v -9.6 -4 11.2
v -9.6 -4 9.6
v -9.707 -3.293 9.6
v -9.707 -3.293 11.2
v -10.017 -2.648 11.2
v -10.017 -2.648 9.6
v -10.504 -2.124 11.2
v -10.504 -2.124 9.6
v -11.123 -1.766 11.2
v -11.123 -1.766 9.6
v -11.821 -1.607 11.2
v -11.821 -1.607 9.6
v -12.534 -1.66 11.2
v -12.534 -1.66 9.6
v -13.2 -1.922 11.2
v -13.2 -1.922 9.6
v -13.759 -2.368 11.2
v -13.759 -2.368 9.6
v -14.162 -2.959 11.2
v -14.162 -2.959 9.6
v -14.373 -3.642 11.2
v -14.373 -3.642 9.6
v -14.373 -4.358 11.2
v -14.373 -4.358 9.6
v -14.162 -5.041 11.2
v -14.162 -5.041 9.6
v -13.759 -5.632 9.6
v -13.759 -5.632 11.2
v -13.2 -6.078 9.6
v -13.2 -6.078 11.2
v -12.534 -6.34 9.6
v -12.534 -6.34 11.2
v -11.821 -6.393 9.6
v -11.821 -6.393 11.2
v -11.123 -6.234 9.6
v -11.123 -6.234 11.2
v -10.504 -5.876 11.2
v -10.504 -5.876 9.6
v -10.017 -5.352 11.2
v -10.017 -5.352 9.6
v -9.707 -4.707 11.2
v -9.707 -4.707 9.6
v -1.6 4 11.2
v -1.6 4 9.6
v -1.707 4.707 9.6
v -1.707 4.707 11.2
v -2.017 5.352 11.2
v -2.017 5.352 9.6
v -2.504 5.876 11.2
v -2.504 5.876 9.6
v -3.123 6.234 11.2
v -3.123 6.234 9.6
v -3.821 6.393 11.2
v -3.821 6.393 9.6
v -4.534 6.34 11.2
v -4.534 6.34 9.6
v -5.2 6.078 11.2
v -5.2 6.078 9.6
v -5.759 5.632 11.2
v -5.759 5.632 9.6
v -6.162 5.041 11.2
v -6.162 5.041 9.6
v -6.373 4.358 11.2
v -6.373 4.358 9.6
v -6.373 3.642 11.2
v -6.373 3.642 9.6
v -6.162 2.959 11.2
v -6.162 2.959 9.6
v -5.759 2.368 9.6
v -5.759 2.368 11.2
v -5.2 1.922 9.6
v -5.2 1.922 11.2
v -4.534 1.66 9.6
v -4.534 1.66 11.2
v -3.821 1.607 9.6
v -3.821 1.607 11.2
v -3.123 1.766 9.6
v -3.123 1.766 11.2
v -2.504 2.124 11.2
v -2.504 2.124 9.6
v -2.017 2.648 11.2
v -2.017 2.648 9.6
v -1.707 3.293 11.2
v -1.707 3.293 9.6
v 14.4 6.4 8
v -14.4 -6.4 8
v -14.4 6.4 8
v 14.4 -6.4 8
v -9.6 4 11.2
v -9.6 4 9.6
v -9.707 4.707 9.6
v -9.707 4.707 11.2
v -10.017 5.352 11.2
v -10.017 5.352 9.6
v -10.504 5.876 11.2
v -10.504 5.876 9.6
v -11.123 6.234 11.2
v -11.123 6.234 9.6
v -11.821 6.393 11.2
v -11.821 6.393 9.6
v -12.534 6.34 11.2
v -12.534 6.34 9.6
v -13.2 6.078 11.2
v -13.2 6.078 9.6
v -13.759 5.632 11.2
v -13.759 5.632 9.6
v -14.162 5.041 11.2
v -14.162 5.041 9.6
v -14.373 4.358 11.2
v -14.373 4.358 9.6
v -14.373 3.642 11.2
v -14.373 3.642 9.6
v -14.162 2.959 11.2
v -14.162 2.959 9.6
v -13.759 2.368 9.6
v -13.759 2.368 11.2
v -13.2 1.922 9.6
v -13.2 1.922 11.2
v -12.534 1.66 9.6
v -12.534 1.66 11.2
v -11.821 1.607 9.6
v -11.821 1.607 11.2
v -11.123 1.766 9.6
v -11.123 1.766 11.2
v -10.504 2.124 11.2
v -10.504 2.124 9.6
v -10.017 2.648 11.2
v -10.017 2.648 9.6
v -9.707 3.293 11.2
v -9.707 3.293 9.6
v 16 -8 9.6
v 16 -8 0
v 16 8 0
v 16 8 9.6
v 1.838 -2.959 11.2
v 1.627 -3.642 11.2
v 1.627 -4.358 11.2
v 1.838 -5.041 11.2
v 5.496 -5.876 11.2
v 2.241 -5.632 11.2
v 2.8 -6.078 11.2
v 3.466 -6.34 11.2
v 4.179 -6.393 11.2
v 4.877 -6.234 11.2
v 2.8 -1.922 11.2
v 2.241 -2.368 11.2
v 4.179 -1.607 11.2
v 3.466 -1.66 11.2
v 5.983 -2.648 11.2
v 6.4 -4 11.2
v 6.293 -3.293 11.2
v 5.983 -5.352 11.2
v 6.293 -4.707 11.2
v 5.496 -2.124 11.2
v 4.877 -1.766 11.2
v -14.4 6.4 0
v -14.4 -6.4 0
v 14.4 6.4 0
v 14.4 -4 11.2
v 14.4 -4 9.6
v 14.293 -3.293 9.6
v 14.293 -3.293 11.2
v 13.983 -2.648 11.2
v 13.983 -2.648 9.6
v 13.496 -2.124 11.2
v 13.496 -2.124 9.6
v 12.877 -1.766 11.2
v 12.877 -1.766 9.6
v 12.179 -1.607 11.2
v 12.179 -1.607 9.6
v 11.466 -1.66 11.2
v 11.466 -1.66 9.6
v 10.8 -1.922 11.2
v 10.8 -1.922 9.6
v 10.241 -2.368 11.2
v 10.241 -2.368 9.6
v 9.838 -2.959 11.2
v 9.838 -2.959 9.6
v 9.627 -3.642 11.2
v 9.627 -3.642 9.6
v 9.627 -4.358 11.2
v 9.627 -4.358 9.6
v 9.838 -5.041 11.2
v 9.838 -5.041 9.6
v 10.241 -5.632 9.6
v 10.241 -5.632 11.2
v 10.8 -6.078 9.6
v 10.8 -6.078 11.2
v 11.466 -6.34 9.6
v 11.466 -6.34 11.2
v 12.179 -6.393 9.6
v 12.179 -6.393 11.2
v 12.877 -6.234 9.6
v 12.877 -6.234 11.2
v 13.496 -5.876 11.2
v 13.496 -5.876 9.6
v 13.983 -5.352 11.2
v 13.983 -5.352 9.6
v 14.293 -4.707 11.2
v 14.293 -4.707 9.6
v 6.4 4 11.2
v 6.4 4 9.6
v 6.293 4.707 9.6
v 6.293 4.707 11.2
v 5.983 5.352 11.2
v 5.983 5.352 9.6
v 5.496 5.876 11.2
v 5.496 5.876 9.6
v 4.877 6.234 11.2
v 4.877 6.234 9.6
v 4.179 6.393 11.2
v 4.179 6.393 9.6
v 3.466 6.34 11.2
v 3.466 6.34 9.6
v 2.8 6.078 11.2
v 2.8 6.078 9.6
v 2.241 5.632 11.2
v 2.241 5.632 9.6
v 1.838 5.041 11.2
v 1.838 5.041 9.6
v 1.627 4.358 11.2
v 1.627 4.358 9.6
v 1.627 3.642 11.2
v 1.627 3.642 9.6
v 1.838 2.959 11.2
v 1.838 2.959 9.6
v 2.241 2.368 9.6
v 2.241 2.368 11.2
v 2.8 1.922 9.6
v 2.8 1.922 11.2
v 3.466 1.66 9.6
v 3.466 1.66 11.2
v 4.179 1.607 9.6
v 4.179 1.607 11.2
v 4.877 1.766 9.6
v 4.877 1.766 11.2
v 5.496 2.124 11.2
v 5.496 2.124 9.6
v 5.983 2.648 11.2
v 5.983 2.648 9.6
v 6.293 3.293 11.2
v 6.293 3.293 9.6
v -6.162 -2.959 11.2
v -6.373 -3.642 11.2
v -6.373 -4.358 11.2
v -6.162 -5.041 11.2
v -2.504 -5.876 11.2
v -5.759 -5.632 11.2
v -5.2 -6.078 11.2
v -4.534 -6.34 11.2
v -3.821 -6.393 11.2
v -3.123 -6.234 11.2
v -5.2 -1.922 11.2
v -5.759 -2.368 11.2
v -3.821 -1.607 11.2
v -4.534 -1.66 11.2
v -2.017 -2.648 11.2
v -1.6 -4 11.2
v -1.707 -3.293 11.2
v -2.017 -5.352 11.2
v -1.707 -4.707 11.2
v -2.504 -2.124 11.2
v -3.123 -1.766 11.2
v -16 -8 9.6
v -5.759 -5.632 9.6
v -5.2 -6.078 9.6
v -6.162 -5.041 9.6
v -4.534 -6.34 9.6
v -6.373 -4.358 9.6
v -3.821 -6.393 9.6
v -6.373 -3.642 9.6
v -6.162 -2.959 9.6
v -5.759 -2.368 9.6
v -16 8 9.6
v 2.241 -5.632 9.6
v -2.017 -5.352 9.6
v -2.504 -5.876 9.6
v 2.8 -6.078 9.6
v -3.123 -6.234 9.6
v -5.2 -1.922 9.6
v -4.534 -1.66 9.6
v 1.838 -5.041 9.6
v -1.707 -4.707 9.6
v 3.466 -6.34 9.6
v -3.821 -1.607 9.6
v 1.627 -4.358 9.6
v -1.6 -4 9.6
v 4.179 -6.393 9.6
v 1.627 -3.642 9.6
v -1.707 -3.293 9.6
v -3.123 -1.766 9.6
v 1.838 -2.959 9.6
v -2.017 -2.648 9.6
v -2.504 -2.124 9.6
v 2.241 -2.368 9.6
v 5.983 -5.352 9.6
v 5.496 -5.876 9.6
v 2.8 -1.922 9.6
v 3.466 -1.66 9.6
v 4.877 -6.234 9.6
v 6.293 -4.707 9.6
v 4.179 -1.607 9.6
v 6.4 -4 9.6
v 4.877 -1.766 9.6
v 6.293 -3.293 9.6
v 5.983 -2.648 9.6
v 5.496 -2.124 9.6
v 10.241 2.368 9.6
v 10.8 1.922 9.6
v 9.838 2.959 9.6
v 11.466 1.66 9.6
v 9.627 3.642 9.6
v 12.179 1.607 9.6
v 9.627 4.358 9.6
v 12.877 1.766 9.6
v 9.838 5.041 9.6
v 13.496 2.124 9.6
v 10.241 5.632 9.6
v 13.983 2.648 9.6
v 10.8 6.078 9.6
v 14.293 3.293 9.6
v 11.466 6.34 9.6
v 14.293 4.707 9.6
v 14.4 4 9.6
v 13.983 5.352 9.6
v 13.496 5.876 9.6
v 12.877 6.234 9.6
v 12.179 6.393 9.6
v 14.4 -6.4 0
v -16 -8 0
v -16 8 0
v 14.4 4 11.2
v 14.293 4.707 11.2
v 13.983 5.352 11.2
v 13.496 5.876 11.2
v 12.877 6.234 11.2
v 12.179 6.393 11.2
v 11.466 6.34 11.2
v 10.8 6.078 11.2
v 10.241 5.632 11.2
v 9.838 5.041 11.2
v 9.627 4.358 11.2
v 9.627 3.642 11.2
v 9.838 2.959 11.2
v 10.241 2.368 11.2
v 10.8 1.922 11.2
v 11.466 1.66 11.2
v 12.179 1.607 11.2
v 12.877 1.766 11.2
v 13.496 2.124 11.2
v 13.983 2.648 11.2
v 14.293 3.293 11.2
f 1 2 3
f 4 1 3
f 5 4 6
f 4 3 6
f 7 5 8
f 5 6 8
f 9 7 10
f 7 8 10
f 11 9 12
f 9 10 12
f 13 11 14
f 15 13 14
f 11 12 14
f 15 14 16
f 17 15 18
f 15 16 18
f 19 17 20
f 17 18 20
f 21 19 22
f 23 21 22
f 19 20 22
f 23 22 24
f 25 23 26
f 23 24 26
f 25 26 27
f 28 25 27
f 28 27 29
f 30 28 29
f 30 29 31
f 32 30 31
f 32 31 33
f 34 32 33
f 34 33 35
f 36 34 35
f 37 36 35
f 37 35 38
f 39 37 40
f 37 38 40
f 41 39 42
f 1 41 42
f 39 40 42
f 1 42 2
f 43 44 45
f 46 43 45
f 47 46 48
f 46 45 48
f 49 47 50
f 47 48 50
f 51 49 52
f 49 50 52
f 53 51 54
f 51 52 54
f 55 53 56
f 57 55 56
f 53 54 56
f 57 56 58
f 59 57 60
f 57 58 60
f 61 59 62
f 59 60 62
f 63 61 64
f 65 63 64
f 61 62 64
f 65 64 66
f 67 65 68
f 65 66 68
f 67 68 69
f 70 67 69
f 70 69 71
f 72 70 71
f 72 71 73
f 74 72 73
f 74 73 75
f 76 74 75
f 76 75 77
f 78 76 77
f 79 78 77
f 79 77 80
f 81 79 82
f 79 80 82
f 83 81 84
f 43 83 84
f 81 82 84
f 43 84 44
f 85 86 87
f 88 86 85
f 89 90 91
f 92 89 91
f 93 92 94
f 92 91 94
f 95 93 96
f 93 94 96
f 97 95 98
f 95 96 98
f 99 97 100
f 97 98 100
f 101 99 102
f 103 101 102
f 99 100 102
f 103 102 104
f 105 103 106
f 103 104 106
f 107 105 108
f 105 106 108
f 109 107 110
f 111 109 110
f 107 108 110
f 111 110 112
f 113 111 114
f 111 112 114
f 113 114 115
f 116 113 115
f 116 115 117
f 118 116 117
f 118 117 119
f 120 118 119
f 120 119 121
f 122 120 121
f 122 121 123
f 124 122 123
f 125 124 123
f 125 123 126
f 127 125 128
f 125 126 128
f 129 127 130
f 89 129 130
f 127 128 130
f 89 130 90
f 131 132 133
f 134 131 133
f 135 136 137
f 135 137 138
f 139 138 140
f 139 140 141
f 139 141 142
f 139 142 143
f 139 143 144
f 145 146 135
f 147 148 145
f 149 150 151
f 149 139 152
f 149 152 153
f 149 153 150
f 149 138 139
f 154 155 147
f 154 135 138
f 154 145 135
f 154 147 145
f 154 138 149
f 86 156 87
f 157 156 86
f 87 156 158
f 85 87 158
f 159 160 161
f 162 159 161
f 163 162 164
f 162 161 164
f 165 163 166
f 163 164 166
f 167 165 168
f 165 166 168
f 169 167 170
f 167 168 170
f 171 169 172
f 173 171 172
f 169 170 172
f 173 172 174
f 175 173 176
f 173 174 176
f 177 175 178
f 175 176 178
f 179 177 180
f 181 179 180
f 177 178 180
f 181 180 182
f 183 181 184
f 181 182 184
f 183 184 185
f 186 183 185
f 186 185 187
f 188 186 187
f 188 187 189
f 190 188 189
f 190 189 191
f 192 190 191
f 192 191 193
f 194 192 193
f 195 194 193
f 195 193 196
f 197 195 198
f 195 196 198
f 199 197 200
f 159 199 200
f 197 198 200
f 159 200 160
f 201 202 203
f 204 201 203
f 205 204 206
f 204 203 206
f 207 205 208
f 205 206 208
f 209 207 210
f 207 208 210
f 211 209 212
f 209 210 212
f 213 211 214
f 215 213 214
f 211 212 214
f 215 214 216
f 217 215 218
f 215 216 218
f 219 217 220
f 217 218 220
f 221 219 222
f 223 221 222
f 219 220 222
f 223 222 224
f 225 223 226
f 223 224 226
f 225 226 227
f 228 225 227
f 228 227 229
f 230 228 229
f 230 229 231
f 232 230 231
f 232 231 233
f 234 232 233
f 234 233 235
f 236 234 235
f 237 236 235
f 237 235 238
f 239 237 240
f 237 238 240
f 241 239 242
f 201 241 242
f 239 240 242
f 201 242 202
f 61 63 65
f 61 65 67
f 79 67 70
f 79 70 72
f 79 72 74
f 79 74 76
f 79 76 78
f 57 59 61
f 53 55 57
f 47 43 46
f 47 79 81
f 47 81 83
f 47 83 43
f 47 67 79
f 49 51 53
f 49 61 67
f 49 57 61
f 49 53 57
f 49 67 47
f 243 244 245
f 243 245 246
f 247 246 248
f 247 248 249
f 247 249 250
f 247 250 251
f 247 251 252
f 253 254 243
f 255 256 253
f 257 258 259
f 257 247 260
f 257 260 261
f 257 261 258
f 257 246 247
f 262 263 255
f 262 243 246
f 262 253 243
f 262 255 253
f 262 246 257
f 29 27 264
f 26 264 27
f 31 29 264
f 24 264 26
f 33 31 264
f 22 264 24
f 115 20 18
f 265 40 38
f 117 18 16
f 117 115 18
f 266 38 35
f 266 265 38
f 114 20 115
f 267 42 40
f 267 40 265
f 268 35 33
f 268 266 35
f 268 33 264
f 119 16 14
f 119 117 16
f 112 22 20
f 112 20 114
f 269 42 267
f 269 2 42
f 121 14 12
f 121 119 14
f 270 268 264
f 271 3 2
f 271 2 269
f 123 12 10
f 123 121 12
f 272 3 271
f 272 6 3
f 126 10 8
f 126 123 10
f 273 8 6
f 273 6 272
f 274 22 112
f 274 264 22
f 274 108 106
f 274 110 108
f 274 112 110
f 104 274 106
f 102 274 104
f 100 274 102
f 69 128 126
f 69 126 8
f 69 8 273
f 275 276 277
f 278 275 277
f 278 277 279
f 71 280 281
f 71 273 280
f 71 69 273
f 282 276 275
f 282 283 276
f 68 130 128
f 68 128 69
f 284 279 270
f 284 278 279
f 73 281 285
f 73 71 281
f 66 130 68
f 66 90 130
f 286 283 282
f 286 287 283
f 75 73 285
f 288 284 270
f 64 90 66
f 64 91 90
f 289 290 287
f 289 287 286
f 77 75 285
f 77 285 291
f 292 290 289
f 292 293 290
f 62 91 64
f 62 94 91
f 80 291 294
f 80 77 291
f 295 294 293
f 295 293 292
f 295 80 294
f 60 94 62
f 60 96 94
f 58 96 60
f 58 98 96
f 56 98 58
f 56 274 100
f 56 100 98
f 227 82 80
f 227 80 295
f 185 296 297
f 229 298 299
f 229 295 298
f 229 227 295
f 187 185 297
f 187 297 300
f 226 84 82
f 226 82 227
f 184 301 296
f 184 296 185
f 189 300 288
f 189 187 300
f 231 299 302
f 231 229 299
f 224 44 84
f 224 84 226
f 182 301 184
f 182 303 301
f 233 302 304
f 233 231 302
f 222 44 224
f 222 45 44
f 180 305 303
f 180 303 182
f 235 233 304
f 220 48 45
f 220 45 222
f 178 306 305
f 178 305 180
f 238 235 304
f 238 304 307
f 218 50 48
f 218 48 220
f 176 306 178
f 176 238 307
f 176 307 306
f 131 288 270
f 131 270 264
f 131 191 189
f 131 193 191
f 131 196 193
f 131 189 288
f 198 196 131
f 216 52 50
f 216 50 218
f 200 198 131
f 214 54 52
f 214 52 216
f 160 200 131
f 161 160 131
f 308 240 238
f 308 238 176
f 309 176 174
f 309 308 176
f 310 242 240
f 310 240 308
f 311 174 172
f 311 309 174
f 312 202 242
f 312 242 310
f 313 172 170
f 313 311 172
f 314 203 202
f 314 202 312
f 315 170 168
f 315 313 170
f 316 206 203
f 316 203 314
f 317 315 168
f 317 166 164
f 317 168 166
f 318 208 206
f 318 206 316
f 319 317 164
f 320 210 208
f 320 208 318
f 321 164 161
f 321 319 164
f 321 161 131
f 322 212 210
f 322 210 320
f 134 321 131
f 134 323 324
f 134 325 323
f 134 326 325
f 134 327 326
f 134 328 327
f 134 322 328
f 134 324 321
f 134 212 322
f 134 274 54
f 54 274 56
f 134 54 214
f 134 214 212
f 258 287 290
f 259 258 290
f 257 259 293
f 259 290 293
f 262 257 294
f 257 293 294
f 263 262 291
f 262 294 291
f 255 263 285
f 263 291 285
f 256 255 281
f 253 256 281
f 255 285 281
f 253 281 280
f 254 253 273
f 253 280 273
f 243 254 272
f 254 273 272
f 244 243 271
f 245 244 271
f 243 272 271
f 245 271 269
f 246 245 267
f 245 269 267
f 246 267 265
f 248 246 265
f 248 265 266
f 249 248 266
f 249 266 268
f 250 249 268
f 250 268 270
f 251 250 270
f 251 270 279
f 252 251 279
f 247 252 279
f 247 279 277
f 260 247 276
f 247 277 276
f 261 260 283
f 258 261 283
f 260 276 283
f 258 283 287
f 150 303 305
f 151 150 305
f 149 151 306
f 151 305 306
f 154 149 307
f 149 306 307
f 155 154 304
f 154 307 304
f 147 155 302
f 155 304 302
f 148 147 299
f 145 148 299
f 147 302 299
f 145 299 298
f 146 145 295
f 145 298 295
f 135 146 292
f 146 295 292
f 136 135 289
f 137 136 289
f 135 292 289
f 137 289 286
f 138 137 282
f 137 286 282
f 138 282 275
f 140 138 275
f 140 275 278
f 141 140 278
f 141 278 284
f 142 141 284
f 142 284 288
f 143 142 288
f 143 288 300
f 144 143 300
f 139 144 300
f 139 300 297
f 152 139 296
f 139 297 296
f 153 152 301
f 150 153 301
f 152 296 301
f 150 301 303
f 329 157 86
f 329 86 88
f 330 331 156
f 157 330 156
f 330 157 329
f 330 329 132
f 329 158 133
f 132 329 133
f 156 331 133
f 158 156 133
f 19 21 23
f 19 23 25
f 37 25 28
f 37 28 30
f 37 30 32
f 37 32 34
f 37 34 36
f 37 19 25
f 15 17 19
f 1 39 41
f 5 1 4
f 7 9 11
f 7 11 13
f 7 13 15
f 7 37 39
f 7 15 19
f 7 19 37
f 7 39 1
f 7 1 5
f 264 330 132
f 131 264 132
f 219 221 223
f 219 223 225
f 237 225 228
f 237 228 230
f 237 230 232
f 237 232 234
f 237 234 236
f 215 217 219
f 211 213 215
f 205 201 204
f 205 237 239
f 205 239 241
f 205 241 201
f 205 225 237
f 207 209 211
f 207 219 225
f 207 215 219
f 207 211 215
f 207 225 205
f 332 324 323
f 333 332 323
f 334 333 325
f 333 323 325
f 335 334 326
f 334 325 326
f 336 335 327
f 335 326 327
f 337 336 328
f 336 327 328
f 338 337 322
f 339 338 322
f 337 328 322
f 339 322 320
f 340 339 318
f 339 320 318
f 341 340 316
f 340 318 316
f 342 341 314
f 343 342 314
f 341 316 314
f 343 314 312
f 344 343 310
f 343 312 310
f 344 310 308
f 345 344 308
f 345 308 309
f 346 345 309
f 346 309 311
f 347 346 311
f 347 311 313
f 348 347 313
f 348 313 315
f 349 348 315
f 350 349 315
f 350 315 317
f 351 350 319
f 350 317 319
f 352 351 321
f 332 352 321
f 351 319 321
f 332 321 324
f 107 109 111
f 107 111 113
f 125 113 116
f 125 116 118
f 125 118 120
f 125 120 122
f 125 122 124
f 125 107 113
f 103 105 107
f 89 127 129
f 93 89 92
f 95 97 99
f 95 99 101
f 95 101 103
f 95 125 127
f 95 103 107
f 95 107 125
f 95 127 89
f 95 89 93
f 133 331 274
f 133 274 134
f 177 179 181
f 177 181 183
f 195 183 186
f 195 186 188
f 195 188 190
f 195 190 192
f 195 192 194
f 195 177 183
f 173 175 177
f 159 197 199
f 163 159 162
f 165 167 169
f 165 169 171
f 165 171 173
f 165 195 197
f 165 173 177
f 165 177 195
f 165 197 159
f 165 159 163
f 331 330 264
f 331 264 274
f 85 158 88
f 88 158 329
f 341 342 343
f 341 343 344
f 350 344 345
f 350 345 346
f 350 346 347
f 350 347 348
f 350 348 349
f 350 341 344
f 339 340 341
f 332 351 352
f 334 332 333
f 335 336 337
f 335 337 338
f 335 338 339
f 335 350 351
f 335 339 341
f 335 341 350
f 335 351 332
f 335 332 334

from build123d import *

# Parameters (mm, degrees)
F0_W     = 32
F0_H     = 16
F1_DEPTH = 9.6
F2_W     = 28.8
F2_H     = 12.8
F3_DEPTH = 8
F4_R     = 2.4
F5_DEPTH = 1.6


with BuildPart() as f1:
    # F0 (on Top) → F1 (new body)
    with BuildSketch(Plane.XY):
        Rectangle(F0_W, F0_H)
    extrude(amount=F1_DEPTH)

    # F2 (on face) → F3 (cut)
    with BuildSketch(Plane(origin=(0, 0, 0), x_dir=(1, 0, 0), z_dir=(0, 0, -1))):
        Rectangle(F2_W, F2_H)
    extrude(amount=-F3_DEPTH, mode=Mode.SUBTRACT)

    # F4 (on face) → F5 (join)
    with BuildSketch(Plane.XY.offset(9.6)):
        with Locations((-12, 4)):
            Circle(F4_R)
        with Locations((-4, 4)):
            Circle(F4_R)
        with Locations((4, 4)):
            Circle(F4_R)
        with Locations((12, 4)):
            Circle(F4_R)
        with Locations((-12, -4)):
            Circle(F4_R)
        with Locations((-4, -4)):
            Circle(F4_R)
        with Locations((4, -4)):
            Circle(F4_R)
        with Locations((12, -4)):
            Circle(F4_R)
    extrude(amount=F5_DEPTH)


solid = f1.part
